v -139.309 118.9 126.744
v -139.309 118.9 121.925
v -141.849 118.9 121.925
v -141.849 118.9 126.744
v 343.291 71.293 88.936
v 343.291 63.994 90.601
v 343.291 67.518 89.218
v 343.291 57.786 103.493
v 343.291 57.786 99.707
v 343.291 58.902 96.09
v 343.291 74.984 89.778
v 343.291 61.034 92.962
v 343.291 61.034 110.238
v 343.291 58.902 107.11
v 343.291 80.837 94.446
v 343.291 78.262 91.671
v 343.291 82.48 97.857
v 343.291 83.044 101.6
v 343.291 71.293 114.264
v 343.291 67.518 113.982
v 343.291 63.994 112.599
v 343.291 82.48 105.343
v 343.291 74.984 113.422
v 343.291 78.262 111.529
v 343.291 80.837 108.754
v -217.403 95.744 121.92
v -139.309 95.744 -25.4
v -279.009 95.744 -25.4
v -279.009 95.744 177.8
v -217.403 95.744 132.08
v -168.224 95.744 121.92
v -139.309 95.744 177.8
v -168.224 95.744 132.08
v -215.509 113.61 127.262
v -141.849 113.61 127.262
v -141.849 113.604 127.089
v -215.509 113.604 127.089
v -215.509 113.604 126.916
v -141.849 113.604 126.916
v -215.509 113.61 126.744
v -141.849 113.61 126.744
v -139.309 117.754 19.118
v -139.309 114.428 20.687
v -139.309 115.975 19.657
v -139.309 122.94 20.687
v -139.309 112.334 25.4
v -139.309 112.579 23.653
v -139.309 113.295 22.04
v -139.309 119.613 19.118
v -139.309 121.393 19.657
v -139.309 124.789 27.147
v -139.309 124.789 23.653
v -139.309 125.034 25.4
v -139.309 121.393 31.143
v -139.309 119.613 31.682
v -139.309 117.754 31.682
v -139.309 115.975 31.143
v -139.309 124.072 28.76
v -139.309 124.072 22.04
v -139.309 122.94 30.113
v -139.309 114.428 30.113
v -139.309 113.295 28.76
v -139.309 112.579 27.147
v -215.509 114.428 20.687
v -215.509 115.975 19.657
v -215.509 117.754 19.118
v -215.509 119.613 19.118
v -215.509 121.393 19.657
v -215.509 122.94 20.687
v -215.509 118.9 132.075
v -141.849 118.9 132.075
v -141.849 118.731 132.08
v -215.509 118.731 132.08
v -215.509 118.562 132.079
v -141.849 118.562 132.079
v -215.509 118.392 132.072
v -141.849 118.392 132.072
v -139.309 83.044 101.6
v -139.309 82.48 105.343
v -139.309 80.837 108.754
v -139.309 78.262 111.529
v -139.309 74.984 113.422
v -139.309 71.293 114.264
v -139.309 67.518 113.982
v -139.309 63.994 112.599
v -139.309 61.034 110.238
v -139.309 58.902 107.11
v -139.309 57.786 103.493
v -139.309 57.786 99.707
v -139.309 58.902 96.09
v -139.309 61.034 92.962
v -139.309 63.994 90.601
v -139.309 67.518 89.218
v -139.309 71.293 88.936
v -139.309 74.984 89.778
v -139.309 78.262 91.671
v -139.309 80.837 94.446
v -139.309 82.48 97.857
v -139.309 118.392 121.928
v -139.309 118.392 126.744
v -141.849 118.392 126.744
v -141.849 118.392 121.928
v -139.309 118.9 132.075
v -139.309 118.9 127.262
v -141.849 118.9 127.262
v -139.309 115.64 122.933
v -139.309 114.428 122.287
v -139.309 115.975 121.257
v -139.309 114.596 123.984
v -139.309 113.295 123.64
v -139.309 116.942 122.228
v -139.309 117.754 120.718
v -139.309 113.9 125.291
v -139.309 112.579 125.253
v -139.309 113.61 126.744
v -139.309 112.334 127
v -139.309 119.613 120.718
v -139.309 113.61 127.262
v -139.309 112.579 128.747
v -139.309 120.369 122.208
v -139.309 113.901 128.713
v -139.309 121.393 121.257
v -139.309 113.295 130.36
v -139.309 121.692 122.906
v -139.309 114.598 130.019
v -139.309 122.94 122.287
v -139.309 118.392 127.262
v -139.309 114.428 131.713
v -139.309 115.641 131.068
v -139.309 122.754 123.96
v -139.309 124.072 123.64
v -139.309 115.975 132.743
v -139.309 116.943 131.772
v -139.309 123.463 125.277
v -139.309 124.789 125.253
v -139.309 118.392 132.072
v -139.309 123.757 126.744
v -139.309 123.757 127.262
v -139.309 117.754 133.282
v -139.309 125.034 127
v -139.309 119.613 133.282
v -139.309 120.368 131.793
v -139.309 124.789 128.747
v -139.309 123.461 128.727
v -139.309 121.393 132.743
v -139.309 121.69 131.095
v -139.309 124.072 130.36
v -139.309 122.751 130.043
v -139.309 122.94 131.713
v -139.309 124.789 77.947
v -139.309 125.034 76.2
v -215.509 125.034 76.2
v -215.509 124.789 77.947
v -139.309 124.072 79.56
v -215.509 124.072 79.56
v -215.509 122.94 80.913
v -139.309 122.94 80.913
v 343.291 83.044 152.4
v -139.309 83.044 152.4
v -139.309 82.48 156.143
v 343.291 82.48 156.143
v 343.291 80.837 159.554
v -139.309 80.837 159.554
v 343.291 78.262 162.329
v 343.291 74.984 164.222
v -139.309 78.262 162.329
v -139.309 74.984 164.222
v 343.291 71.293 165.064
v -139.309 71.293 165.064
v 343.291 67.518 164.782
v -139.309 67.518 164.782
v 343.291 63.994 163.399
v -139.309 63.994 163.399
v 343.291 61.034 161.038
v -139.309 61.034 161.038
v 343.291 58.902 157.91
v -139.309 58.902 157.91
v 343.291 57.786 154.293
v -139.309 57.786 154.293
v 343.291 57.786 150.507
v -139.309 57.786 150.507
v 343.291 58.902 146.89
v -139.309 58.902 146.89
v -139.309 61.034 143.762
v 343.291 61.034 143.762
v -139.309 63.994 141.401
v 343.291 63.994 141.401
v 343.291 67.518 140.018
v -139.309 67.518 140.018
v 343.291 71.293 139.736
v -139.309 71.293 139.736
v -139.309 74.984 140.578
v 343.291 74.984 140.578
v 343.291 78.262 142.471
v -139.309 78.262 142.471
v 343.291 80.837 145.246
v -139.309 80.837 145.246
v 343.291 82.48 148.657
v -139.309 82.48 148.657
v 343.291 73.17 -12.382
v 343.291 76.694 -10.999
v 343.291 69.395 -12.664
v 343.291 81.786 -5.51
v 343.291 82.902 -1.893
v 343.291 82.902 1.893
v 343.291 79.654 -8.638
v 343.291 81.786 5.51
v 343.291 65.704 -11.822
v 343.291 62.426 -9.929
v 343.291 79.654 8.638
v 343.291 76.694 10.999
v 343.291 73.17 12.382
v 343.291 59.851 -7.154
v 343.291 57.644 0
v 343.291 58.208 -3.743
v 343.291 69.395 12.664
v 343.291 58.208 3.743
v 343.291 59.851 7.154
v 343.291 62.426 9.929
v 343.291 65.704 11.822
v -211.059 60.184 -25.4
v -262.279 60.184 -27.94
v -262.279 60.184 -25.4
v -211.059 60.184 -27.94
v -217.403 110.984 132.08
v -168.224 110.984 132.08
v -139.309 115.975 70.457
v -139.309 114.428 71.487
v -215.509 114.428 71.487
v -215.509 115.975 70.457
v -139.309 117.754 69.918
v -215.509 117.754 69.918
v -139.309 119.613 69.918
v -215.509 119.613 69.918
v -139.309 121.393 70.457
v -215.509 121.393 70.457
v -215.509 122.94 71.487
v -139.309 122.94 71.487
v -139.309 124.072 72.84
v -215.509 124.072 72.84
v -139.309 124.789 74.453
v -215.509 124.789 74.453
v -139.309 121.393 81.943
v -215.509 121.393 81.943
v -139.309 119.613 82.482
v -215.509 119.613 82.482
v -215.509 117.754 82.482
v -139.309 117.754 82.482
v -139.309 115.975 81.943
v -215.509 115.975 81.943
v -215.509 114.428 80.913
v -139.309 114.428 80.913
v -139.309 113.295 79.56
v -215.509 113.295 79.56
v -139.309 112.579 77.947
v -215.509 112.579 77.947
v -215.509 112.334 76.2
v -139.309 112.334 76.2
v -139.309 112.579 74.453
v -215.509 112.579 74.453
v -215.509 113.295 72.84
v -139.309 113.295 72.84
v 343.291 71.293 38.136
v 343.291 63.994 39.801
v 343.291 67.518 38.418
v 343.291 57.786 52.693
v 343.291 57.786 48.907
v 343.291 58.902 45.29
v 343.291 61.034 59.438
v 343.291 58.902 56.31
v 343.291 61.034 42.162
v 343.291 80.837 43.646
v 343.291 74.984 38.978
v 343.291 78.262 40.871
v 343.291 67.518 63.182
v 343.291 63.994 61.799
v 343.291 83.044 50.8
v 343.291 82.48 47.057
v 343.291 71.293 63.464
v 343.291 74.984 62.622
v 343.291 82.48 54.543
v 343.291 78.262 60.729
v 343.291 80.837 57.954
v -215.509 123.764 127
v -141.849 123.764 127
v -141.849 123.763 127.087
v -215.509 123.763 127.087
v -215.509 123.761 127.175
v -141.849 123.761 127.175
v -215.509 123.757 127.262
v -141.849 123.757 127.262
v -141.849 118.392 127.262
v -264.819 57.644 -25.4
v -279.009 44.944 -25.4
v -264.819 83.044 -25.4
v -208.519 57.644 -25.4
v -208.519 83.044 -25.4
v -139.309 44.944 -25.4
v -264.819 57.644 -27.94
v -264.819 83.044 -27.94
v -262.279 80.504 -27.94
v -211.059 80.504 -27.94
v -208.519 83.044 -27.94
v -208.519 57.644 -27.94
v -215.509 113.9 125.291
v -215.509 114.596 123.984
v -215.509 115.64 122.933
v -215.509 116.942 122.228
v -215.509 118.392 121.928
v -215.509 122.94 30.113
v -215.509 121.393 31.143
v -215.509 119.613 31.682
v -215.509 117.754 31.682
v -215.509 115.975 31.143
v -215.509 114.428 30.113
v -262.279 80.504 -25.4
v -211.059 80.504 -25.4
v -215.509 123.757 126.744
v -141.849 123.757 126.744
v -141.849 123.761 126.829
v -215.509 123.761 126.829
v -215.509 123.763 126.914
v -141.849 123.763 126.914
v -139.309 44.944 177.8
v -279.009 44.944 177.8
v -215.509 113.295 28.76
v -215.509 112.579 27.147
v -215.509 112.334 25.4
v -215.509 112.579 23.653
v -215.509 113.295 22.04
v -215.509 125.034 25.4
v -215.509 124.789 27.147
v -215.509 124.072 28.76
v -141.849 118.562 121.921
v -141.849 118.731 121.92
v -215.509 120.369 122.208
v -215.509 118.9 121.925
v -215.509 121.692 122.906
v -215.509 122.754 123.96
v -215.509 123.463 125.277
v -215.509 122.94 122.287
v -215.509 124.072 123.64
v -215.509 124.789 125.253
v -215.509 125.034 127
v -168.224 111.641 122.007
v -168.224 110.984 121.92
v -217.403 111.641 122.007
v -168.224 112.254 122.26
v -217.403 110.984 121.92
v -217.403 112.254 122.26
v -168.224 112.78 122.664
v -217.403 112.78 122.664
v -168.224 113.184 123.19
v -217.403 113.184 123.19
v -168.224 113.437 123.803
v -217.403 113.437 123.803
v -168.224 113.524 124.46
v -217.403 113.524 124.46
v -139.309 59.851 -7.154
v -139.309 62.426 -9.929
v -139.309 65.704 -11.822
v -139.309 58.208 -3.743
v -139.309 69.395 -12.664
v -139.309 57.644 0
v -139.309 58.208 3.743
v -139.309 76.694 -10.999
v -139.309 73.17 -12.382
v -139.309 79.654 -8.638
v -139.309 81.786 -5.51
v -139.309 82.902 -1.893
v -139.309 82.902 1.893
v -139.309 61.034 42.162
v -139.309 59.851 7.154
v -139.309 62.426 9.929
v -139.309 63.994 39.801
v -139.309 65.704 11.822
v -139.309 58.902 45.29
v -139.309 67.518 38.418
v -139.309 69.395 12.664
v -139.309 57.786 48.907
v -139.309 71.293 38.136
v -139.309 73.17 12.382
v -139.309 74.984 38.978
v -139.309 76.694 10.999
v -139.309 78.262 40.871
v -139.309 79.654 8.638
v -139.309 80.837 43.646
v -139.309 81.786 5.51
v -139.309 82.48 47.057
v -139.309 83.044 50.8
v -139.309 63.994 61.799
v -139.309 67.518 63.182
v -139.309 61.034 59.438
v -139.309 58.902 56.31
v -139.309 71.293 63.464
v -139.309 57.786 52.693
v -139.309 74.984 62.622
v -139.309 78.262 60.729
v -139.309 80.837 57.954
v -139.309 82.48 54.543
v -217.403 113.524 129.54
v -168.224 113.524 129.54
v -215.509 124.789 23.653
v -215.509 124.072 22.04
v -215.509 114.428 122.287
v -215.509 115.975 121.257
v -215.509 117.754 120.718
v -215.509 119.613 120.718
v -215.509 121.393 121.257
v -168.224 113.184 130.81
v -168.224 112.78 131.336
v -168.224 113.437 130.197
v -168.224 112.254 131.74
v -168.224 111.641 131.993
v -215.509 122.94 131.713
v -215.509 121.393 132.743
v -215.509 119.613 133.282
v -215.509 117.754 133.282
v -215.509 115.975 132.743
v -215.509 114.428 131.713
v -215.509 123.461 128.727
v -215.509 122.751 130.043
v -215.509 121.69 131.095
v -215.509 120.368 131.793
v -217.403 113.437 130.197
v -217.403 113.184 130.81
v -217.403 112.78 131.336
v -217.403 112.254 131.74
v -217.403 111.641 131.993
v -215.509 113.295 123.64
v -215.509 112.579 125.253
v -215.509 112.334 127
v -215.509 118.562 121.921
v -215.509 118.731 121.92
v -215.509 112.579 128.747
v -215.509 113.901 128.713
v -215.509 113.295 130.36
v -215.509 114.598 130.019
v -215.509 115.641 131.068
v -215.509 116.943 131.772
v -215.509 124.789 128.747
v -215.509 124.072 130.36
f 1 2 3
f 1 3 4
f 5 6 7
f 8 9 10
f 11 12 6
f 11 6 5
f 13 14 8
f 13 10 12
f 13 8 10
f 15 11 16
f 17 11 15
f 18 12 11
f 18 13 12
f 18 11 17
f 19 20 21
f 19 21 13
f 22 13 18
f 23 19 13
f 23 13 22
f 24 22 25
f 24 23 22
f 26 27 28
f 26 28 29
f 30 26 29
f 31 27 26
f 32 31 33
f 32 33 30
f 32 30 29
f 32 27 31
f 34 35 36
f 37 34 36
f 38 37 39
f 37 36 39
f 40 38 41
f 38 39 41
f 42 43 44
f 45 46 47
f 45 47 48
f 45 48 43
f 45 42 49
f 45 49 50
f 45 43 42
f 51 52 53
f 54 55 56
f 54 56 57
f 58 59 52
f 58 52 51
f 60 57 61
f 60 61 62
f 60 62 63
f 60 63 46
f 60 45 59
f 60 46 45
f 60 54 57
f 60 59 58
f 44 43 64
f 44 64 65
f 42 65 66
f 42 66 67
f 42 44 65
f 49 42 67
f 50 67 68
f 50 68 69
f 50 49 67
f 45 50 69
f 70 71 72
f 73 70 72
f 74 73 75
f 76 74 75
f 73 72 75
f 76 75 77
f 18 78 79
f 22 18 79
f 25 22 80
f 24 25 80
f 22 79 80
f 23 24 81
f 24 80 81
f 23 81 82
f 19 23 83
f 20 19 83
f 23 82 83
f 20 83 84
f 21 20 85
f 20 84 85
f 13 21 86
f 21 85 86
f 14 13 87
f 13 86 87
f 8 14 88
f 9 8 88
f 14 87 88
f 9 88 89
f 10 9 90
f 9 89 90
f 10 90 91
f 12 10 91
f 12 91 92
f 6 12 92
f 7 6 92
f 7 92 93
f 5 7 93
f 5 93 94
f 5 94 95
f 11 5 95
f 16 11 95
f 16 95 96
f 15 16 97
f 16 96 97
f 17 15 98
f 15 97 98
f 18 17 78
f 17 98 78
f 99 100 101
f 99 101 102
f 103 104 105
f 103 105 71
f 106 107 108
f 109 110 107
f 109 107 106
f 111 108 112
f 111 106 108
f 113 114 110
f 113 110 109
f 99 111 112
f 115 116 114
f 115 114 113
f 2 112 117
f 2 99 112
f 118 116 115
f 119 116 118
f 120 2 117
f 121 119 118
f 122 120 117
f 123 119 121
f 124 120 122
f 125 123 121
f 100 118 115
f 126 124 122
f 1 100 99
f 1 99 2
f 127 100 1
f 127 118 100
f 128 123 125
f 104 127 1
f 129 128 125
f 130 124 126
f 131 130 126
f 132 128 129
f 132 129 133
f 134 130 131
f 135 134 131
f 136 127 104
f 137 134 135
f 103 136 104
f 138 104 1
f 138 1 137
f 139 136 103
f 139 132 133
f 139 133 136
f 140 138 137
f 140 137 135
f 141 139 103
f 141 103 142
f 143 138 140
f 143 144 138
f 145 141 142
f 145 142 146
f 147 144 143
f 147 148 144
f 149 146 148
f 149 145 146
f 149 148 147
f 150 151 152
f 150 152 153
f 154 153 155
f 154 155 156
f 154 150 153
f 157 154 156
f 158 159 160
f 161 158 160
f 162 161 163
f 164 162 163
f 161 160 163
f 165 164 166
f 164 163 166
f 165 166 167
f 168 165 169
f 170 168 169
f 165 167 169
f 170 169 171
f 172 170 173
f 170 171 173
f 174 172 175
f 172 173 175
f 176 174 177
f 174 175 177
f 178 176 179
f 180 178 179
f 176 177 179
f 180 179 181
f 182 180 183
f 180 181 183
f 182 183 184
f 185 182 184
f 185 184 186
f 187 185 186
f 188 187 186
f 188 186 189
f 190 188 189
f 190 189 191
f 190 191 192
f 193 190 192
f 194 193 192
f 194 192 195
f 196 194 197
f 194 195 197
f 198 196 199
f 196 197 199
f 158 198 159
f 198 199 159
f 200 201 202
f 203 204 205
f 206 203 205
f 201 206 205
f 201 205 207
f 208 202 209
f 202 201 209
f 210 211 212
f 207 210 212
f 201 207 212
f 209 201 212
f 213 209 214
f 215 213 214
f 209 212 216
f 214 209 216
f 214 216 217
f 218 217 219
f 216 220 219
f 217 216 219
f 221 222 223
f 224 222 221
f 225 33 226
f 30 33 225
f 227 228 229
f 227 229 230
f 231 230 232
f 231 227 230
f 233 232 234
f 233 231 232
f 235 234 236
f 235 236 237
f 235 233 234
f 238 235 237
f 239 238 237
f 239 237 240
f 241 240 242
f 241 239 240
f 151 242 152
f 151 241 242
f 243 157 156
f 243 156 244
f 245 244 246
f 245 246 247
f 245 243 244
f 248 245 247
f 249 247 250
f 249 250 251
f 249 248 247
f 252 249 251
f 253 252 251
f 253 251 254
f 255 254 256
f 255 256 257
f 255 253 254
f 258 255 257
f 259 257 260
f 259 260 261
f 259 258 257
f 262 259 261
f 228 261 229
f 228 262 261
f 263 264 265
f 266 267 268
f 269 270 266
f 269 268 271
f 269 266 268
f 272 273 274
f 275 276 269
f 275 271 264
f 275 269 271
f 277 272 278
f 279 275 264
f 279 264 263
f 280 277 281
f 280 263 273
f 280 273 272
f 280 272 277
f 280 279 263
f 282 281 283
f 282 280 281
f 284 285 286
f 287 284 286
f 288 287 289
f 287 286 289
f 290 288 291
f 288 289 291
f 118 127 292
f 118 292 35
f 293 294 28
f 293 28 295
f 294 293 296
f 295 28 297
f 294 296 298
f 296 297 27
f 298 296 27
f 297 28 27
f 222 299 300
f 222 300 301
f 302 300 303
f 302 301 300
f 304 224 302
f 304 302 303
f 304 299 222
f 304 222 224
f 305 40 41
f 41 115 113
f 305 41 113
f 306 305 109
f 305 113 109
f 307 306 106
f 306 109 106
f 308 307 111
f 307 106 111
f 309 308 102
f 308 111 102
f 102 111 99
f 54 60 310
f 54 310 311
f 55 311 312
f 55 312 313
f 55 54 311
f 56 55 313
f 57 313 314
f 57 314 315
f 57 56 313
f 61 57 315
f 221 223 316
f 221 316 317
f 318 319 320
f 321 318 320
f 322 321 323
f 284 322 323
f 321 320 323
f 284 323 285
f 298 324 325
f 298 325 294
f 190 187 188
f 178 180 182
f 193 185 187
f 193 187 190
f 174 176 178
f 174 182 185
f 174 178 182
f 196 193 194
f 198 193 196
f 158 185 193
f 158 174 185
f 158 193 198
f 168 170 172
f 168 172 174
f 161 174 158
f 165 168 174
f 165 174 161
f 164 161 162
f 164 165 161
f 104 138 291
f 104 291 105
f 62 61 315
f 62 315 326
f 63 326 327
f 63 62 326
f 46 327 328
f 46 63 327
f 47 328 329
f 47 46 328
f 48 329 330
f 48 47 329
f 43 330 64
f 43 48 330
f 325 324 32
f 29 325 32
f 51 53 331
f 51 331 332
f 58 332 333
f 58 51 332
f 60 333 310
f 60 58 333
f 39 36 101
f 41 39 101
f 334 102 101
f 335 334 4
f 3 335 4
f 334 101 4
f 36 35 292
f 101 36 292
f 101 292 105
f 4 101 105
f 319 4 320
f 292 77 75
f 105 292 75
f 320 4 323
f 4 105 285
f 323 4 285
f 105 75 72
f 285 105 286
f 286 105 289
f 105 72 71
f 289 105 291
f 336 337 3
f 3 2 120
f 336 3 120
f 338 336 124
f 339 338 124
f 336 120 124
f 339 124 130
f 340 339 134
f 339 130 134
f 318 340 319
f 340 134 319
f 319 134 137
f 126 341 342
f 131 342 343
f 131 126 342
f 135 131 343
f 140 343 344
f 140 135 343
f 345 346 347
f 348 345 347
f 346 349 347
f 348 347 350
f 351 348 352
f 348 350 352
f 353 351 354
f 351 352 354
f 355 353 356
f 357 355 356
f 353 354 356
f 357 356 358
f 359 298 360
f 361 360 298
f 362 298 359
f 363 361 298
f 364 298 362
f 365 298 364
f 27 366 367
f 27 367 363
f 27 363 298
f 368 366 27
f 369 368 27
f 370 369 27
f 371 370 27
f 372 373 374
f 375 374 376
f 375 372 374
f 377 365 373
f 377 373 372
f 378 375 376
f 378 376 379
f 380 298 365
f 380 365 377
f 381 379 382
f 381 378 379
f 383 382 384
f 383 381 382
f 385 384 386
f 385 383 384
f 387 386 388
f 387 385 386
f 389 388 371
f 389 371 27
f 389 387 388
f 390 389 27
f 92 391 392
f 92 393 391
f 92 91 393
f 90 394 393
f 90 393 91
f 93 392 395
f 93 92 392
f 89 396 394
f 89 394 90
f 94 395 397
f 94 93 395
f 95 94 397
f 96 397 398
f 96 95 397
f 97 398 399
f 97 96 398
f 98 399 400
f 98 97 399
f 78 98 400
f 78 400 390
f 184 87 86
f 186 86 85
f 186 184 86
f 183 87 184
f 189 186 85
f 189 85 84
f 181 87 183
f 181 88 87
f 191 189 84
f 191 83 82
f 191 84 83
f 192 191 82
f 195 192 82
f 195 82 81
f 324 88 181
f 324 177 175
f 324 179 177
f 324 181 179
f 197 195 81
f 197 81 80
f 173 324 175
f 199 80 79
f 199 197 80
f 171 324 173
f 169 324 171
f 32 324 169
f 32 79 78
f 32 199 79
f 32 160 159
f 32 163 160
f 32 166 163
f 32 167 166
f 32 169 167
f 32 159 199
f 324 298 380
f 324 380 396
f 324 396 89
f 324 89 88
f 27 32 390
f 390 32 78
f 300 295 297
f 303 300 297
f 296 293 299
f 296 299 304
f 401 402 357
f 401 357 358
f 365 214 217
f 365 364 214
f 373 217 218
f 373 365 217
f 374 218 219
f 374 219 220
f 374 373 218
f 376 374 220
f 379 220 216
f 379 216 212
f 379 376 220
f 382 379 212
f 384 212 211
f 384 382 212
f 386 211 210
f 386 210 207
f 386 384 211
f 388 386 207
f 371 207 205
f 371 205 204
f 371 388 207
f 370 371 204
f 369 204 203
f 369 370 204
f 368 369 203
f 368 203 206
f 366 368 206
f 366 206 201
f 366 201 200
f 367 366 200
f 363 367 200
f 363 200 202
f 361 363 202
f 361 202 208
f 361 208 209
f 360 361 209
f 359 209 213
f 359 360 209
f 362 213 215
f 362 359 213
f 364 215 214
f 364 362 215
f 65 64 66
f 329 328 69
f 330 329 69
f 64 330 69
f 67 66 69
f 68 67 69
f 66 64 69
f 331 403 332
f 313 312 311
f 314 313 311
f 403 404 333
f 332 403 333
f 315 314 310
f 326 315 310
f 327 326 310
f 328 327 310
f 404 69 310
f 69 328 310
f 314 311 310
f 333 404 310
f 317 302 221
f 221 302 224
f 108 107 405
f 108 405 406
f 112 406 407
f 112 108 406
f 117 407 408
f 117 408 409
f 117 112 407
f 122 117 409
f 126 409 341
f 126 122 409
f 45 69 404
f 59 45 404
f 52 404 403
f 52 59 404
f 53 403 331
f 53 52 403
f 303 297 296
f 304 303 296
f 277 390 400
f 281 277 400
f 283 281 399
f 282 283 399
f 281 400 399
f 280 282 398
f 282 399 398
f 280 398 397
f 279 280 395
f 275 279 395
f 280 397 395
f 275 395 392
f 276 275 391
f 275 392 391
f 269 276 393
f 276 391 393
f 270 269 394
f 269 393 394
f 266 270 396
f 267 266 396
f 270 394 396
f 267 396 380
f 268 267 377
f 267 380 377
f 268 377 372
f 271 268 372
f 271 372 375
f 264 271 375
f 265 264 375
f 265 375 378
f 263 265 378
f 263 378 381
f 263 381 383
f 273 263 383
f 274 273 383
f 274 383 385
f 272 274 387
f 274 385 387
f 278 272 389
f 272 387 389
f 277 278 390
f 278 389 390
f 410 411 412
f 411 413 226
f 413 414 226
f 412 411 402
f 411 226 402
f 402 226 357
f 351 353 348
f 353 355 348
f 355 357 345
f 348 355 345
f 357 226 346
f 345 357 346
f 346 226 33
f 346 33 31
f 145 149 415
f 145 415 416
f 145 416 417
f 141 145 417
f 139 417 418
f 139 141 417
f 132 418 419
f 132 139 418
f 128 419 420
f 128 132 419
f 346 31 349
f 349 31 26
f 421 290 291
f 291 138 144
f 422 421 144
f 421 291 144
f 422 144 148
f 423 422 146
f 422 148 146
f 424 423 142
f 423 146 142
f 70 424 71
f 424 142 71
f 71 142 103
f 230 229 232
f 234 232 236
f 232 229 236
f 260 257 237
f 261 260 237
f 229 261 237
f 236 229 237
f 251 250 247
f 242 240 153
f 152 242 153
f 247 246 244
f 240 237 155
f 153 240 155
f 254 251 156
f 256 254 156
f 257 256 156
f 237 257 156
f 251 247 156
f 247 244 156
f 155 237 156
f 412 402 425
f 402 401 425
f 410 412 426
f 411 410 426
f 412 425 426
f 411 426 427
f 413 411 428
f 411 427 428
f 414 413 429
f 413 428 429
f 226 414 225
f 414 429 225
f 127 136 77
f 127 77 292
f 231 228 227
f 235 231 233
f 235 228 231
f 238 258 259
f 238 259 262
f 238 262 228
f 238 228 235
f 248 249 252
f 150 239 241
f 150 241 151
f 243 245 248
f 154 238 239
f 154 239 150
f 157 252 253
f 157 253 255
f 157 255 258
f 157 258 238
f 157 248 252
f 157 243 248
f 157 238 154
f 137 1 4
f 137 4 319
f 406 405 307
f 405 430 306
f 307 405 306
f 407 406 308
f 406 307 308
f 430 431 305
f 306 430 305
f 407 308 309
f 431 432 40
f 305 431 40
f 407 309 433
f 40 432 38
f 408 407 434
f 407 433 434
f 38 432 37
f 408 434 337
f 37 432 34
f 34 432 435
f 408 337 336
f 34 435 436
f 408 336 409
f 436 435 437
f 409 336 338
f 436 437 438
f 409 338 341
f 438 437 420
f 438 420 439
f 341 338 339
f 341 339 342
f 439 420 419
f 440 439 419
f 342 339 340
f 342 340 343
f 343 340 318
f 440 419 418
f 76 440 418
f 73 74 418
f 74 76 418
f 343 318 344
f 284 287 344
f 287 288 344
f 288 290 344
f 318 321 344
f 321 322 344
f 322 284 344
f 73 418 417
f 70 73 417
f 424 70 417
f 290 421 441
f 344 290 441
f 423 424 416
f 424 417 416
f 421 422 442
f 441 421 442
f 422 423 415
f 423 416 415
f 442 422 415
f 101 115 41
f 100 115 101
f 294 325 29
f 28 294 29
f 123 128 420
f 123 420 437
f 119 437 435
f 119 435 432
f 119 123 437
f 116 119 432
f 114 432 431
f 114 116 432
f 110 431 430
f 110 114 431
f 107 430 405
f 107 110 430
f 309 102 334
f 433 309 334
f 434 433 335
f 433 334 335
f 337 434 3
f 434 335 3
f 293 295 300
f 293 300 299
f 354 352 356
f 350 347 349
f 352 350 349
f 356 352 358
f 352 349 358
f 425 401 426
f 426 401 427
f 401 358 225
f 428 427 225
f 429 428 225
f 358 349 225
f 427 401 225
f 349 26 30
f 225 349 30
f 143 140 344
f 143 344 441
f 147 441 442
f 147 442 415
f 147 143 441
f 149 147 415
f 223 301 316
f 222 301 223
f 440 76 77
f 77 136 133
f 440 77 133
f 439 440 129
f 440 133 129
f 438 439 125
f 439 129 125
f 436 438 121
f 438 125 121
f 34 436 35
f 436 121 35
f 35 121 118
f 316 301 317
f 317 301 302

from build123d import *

# Parameters (mm, degrees)
F0_W      = 406.4
F0_H      = 12.7
F0_W_2    = 139.7
F0_H_2    = 38.1
F2_DEPTH  = 25.4
F3_DEPTH  = 25.4
F4_DEPTH  = 76.2
F5_W      = 76.2
F5_H      = 50.8
F6_DEPTH  = 139.7
F7_R      = 12.7
F8_DEPTH  = 482.6
F9_DEPTH  = 7.62
F10_W     = 56.2998503447
F10_H     = 25.4
F11_DEPTH = 2.54
F12_W     = 51.2198503447
F12_H     = 20.32
F13_DEPTH = 2.54
F14_DEPTH = 12.7
F15_DEPTH = 12.7
F18_DEPTH = 76.2
F20_DEPTH = 127
F19_W     = 0.508
F19_H     = 0.5186796188
F21_DEPTH = 101.6
F22_DEPTH = 2.54
F17_W     = 49.1785109043
F17_H     = 5.08
F23_DEPTH = 17.78
F24_R     = 2.54
F25_R     = 2.54


with BuildPart() as f1:
    # F0 (on Top) → F1 (revolve)
    with BuildSketch(Plane.XY):
        with Locations((63.891280989, 63.9939386676)):
            Rectangle(F0_W, F0_H)
    revolve(axis=Axis((63.891280989, 70.3439386676, 0), (-1, 0, 0)))

    # F0 (on Top) → F2 (join)
    with BuildSketch(Plane.XY):
        with Locations((-209.158719011, 89.3939386676)):
            Rectangle(F0_W_2, F0_H_2)
        Polygon((-139.308719011, 57.6439386676), (-139.308719011, 70.3439386676), (-279.008719011, 70.3439386676), (-279.008719011, 32.2439386676), (-139.308719011, 32.2439386676), align=None)
    extrude(amount=F2_DEPTH)

    # F0 (on Top) → F3 (join)
    with BuildSketch(Plane.XY):
        with Locations((-209.158719011, 89.3939386676)):
            Rectangle(F0_W_2, F0_H_2)
        Polygon((-139.308719011, 57.6439386676), (-139.308719011, 70.3439386676), (-279.008719011, 70.3439386676), (-279.008719011, 32.2439386676), (-139.308719011, 32.2439386676), align=None)
    extrude(amount=-F3_DEPTH)

    # F4 (add): a face of the model
    f4_faces = [f1.faces().sort_by_distance(p)[0] for p in [
        (267.091280989, 70.3439386676, 0),
    ]]
    extrude(f4_faces, amount=F4_DEPTH)

    # F5 (on face) → F6 (join)
    with BuildSketch(Plane.YZ.offset(-139.308719011)):
        with Locations((70.3439386676, 152.4)):
            Rectangle(F5_W, F5_H)
        with Locations((70.3439386676, 101.6)):
            Rectangle(F5_W, F5_H)
        with Locations((70.3439386676, 50.8)):
            Rectangle(F5_W, F5_H)
    extrude(amount=-F6_DEPTH)

    # F7 (on face) → F8 (join)
    with BuildSketch(Plane.YZ.offset(-139.308719011)):
        with Locations((70.3439386676, 50.8)):
            Circle(F7_R)
        with Locations((70.3439386676, 101.6)):
            Circle(F7_R)
        with Locations((70.3439386676, 152.4)):
            Circle(F7_R)
    extrude(amount=F8_DEPTH)

    # F9 (add): faces of the model
    f9_faces = [f1.faces().sort_by_distance(p)[0] for p in [
        (-209.158719011, 108.4439386676, 0),
        (-209.158719011, 108.4439386676, 101.6),
    ]]
    extrude(f9_faces, amount=-F9_DEPTH)

    # F10 (on face) → F11 (join)
    with BuildSketch(Plane(origin=(0, 0, -25.4), x_dir=(1, 0, 0), z_dir=(0, 0, -1))):
        with Locations((-236.669190228, -70.3439386676)):
            Rectangle(F10_W, F10_H)
    extrude(amount=F11_DEPTH)

    # F12 (on face) → F13 (cut)
    with BuildSketch(Plane(origin=(0, 0, -27.94), x_dir=(1, 0, 0), z_dir=(0, 0, -1))):
        with Locations((-236.669190228, -70.3439386676)):
            Rectangle(F12_W, F12_H)
    extrude(amount=-F13_DEPTH, mode=Mode.SUBTRACT)

    # F14 (cut): faces of the model
    f14_faces = [f1.faces().sort_by_distance(p)[0] for p in [
        (-209.158719011, 108.4439386676, 0),
        (-209.158719011, 108.4439386676, 101.6),
    ]]
    extrude(f14_faces, amount=-F14_DEPTH, mode=Mode.SUBTRACT)

    # F15 (cut): faces of the model
    f15_faces = [f1.faces().sort_by_distance(p)[0] for p in [
        (-209.158719011, 32.2439386676, 0),
        (-209.158719011, 32.2439386676, 101.6),
    ]]
    extrude(f15_faces, amount=-F15_DEPTH, mode=Mode.SUBTRACT)

    # F17 (on face) → F23 (join)
    with BuildSketch(Plane(origin=(0, 95.7439386676, 0), x_dir=(-1, 0, 0), z_dir=(0, 1, 0))):
        with Locations((192.8136348724, 124.46)):
            Rectangle(F17_W, F17_H)
        with Locations((192.8136348724, 129.54)):
            Rectangle(F17_W, F17_H)
    extrude(amount=F23_DEPTH)

    # F24
    f24_edges = [f1.edges().sort_by_distance(p)[0] for p in [
        (-192.813635, 113.523939, 121.92),
    ]]
    fillet(f24_edges, radius=F24_R)

    # F25
    f25_edges = [f1.edges().sort_by_distance(p)[0] for p in [
        (-192.813635, 113.523939, 132.08),
    ]]
    fillet(f25_edges, radius=F25_R)


with BuildPart() as f18:
    # F16 (on face) → F18 (new body)
    with BuildSketch(Plane.YZ.offset(-139.308719011)):
        with BuildLine():
            ThreePointArc((125.0336358821, 25.4), (124.4865948415, 27.9784040248), (122.9397249166, 30.1125583423))
            Line((122.9397249166, 30.1125583423), (118.6836358821, 25.4))
            Line((118.6836358821, 25.4), (122.9397249166, 20.6874416577))
            ThreePointArc((122.9397249166, 20.6874416577), (124.4865948415, 22.8215959752), (125.0336358821, 25.4))
        make_face()
        with BuildLine():
            Line((122.9397249166, 20.6874416577), (118.6836358821, 25.4))
            Line((118.6836358821, 25.4), (114.4275468475, 20.6874416577))
            ThreePointArc((114.4275468475, 20.6874416577), (118.6836358821, 19.05), (122.9397249166, 20.6874416577))
        make_face()
        with BuildLine():
            Line((118.6836358821, 25.4), (114.4275468475, 30.1125583423))
            ThreePointArc((114.4275468475, 30.1125583423), (112.3336358821, 25.4), (114.4275468475, 20.6874416577))
            Line((114.4275468475, 20.6874416577), (118.6836358821, 25.4))
        make_face()
        with BuildLine():
            ThreePointArc((122.9397249166, 30.1125583423), (118.6836358821, 31.75), (114.4275468475, 30.1125583423))
            Line((114.4275468475, 30.1125583423), (118.6836358821, 25.4))
            Line((118.6836358821, 25.4), (122.9397249166, 30.1125583423))
        make_face()
    extrude(amount=-F18_DEPTH)


with BuildPart() as f18b:
    # F16 (on face) → F18, piece 2 (new body)
    with BuildSketch(Plane.YZ.offset(-139.308719011)):
        with BuildLine():
            ThreePointArc((125.0336358821, 76.2), (124.4865948415, 78.7784040248), (122.9397249166, 80.9125583423))
            Line((122.9397249166, 80.9125583423), (118.6836358821, 76.2))
            Line((118.6836358821, 76.2), (122.9397249166, 71.4874416577))
            ThreePointArc((122.9397249166, 71.4874416577), (124.4865948415, 73.6215959752), (125.0336358821, 76.2))
        make_face()
        with BuildLine():
            Line((118.6836358821, 76.2), (114.4275468475, 71.4874416577))
            ThreePointArc((114.4275468475, 71.4874416577), (118.6836358821, 69.85), (122.9397249166, 71.4874416577))
            Line((122.9397249166, 71.4874416577), (118.6836358821, 76.2))
        make_face()
        with BuildLine():
            Line((118.6836358821, 76.2), (114.4275468475, 80.9125583423))
            ThreePointArc((114.4275468475, 80.9125583423), (112.3336358821, 76.2), (114.4275468475, 71.4874416577))
            Line((114.4275468475, 71.4874416577), (118.6836358821, 76.2))
        make_face()
        with BuildLine():
            ThreePointArc((122.9397249166, 80.9125583423), (118.6836358821, 82.55), (114.4275468475, 80.9125583423))
            Line((114.4275468475, 80.9125583423), (118.6836358821, 76.2))
            Line((118.6836358821, 76.2), (122.9397249166, 80.9125583423))
        make_face()
    extrude(amount=-F18_DEPTH)


with BuildPart() as f18c:
    # F16 (on face) → F18, piece 3 (new body)
    with BuildSketch(Plane.YZ.offset(-139.308719011)):
        with BuildLine():
            ThreePointArc((125.0336358821, 127), (124.4865948415, 129.5784040248), (122.9397249166, 131.7125583423))
            Line((122.9397249166, 131.7125583423), (118.6836358821, 127))
            Line((118.6836358821, 127), (122.9397249166, 122.2874416577))
            ThreePointArc((122.9397249166, 122.2874416577), (124.4865948415, 124.4215959752), (125.0336358821, 127))
        make_face()
        with BuildLine():
            Line((118.6836358821, 127), (114.4275468475, 122.2874416577))
            ThreePointArc((114.4275468475, 122.2874416577), (118.6836358821, 120.65), (122.9397249166, 122.2874416577))
            Line((122.9397249166, 122.2874416577), (118.6836358821, 127))
        make_face()
        with BuildLine():
            Line((118.6836358821, 127), (114.4275468475, 131.7125583423))
            ThreePointArc((114.4275468475, 131.7125583423), (112.3336358821, 127), (114.4275468475, 122.2874416577))
            Line((114.4275468475, 122.2874416577), (118.6836358821, 127))
        make_face()
        with BuildLine():
            ThreePointArc((122.9397249166, 131.7125583423), (118.6836358821, 133.35), (114.4275468475, 131.7125583423))
            Line((114.4275468475, 131.7125583423), (118.6836358821, 127))
            Line((118.6836358821, 127), (122.9397249166, 131.7125583423))
        make_face()
    extrude(amount=-F18_DEPTH)

    # F19 (on face) → F20 (cut)
    with BuildSketch(Plane.YZ.offset(-139.308719011)):
        with BuildLine():
            ThreePointArc((118.3923785006, 132.0716436328), (115.0812718007, 130.5818114168), (113.6104088057, 127.2622346878))
            Line((113.6104088057, 127.2622346878), (118.3923785006, 127.2622346878))
            Line((118.3923785006, 127.2622346878), (118.3923785006, 131.1406195164))
            Line((118.3923785006, 131.1406195164), (118.3923785006, 132.0716436328))
        make_face()
        with BuildLine():
            Line((118.3923785006, 126.743555069), (113.610112846, 126.743555069))
            ThreePointArc((113.610112846, 126.743555069), (115.0792285984, 123.4202446824), (118.3923785006, 121.9283563672))
            Line((118.3923785006, 121.9283563672), (118.3923785006, 126.743555069))
        make_face()
        with BuildLine():
            Line((123.7571589181, 126.743555069), (118.9003785006, 126.743555069))
            Line((118.9003785006, 126.743555069), (118.9003785006, 121.9246258623))
            ThreePointArc((118.9003785006, 121.9246258623), (122.2616587088, 123.3938729014), (123.7571589181, 126.743555069))
        make_face()
        with BuildLine():
            Line((118.9003785006, 131.1406195164), (118.9003785006, 127.2622346878))
            Line((118.9003785006, 127.2622346878), (123.7568629584, 127.2622346878))
            ThreePointArc((123.7568629584, 127.2622346878), (122.259600463, 130.6081681385), (118.9003785006, 132.0753741377))
            Line((118.9003785006, 132.0753741377), (118.9003785006, 131.1406195164))
        make_face()
    extrude(amount=-F20_DEPTH, mode=Mode.SUBTRACT)

    # F19 (on face) → F21 (cut)
    with BuildSketch(Plane.YZ.offset(-139.308719011)):
        with BuildLine():
            Line((118.9003785006, 126.743555069), (118.3923785006, 126.743555069))
            Line((118.3923785006, 126.743555069), (118.3923785006, 121.9283563672))
            ThreePointArc((118.3923785006, 121.9283563672), (118.6463318388, 121.9201369695), (118.9003785006, 121.9246258623))
            Line((118.9003785006, 121.9246258623), (118.9003785006, 126.743555069))
        make_face()
        with BuildLine():
            Line((118.3923785006, 127.2622346878), (113.6104088057, 127.2622346878))
            ThreePointArc((113.6104088057, 127.2622346878), (113.603636709, 127.0028986581), (113.610112846, 126.743555069))
            Line((113.610112846, 126.743555069), (118.3923785006, 126.743555069))
            Line((118.3923785006, 126.743555069), (118.3923785006, 127.2622346878))
        make_face()
        with BuildLine():
            Line((118.3923785006, 131.1406195164), (118.3923785006, 127.2622346878))
            Line((118.3923785006, 127.2622346878), (118.9003785006, 127.2622346878))
            Line((118.9003785006, 127.2622346878), (118.9003785006, 131.1406195164))
            Line((118.9003785006, 131.1406195164), (118.9003785006, 132.0753741377))
            ThreePointArc((118.9003785006, 132.0753741377), (118.6463318388, 132.0798630305), (118.3923785006, 132.0716436328))
            Line((118.3923785006, 132.0716436328), (118.3923785006, 131.1406195164))
        make_face()
        with BuildLine():
            Line((123.7568629584, 127.2622346878), (118.9003785006, 127.2622346878))
            Line((118.9003785006, 127.2622346878), (118.9003785006, 126.743555069))
            Line((118.9003785006, 126.743555069), (123.7571589181, 126.743555069))
            ThreePointArc((123.7571589181, 126.743555069), (123.7620163829, 126.8717366442), (123.7636358821, 127))
            ThreePointArc((123.7636358821, 127), (123.7619423689, 127.1311610689), (123.7568629584, 127.2622346878))
        make_face()
        with Locations((118.6463785006, 127.0028948784)):
            Rectangle(F19_W, F19_H)
    extrude(amount=-F21_DEPTH, mode=Mode.SUBTRACT)

    # F19 (on face) → F22 (join)
    with BuildSketch(Plane.YZ.offset(-139.308719011)):
        with BuildLine():
            Line((118.3923785006, 127.2622346878), (113.6104088057, 127.2622346878))
            ThreePointArc((113.6104088057, 127.2622346878), (113.603636709, 127.0028986581), (113.610112846, 126.743555069))
            Line((113.610112846, 126.743555069), (118.3923785006, 126.743555069))
            Line((118.3923785006, 126.743555069), (118.3923785006, 127.2622346878))
        make_face()
        with BuildLine():
            Line((118.3923785006, 131.1406195164), (118.3923785006, 127.2622346878))
            Line((118.3923785006, 127.2622346878), (118.9003785006, 127.2622346878))
            Line((118.9003785006, 127.2622346878), (118.9003785006, 131.1406195164))
            Line((118.9003785006, 131.1406195164), (118.9003785006, 132.0753741377))
            ThreePointArc((118.9003785006, 132.0753741377), (118.6463318388, 132.0798630305), (118.3923785006, 132.0716436328))
            Line((118.3923785006, 132.0716436328), (118.3923785006, 131.1406195164))
        make_face()
        with BuildLine():
            Line((118.9003785006, 126.743555069), (118.3923785006, 126.743555069))
            Line((118.3923785006, 126.743555069), (118.3923785006, 121.9283563672))
            ThreePointArc((118.3923785006, 121.9283563672), (118.6463318388, 121.9201369695), (118.9003785006, 121.9246258623))
            Line((118.9003785006, 121.9246258623), (118.9003785006, 126.743555069))
        make_face()
        with BuildLine():
            Line((123.7568629584, 127.2622346878), (118.9003785006, 127.2622346878))
            Line((118.9003785006, 127.2622346878), (118.9003785006, 126.743555069))
            Line((118.9003785006, 126.743555069), (123.7571589181, 126.743555069))
            ThreePointArc((123.7571589181, 126.743555069), (123.7620163829, 126.8717366442), (123.7636358821, 127))
            ThreePointArc((123.7636358821, 127), (123.7619423689, 127.1311610689), (123.7568629584, 127.2622346878))
        make_face()
        with Locations((118.6463785006, 127.0028948784)):
            Rectangle(F19_W, F19_H)
    extrude(amount=-F22_DEPTH)


solid = Compound([f1.part, f18.part, f18b.part, f18c.part])
